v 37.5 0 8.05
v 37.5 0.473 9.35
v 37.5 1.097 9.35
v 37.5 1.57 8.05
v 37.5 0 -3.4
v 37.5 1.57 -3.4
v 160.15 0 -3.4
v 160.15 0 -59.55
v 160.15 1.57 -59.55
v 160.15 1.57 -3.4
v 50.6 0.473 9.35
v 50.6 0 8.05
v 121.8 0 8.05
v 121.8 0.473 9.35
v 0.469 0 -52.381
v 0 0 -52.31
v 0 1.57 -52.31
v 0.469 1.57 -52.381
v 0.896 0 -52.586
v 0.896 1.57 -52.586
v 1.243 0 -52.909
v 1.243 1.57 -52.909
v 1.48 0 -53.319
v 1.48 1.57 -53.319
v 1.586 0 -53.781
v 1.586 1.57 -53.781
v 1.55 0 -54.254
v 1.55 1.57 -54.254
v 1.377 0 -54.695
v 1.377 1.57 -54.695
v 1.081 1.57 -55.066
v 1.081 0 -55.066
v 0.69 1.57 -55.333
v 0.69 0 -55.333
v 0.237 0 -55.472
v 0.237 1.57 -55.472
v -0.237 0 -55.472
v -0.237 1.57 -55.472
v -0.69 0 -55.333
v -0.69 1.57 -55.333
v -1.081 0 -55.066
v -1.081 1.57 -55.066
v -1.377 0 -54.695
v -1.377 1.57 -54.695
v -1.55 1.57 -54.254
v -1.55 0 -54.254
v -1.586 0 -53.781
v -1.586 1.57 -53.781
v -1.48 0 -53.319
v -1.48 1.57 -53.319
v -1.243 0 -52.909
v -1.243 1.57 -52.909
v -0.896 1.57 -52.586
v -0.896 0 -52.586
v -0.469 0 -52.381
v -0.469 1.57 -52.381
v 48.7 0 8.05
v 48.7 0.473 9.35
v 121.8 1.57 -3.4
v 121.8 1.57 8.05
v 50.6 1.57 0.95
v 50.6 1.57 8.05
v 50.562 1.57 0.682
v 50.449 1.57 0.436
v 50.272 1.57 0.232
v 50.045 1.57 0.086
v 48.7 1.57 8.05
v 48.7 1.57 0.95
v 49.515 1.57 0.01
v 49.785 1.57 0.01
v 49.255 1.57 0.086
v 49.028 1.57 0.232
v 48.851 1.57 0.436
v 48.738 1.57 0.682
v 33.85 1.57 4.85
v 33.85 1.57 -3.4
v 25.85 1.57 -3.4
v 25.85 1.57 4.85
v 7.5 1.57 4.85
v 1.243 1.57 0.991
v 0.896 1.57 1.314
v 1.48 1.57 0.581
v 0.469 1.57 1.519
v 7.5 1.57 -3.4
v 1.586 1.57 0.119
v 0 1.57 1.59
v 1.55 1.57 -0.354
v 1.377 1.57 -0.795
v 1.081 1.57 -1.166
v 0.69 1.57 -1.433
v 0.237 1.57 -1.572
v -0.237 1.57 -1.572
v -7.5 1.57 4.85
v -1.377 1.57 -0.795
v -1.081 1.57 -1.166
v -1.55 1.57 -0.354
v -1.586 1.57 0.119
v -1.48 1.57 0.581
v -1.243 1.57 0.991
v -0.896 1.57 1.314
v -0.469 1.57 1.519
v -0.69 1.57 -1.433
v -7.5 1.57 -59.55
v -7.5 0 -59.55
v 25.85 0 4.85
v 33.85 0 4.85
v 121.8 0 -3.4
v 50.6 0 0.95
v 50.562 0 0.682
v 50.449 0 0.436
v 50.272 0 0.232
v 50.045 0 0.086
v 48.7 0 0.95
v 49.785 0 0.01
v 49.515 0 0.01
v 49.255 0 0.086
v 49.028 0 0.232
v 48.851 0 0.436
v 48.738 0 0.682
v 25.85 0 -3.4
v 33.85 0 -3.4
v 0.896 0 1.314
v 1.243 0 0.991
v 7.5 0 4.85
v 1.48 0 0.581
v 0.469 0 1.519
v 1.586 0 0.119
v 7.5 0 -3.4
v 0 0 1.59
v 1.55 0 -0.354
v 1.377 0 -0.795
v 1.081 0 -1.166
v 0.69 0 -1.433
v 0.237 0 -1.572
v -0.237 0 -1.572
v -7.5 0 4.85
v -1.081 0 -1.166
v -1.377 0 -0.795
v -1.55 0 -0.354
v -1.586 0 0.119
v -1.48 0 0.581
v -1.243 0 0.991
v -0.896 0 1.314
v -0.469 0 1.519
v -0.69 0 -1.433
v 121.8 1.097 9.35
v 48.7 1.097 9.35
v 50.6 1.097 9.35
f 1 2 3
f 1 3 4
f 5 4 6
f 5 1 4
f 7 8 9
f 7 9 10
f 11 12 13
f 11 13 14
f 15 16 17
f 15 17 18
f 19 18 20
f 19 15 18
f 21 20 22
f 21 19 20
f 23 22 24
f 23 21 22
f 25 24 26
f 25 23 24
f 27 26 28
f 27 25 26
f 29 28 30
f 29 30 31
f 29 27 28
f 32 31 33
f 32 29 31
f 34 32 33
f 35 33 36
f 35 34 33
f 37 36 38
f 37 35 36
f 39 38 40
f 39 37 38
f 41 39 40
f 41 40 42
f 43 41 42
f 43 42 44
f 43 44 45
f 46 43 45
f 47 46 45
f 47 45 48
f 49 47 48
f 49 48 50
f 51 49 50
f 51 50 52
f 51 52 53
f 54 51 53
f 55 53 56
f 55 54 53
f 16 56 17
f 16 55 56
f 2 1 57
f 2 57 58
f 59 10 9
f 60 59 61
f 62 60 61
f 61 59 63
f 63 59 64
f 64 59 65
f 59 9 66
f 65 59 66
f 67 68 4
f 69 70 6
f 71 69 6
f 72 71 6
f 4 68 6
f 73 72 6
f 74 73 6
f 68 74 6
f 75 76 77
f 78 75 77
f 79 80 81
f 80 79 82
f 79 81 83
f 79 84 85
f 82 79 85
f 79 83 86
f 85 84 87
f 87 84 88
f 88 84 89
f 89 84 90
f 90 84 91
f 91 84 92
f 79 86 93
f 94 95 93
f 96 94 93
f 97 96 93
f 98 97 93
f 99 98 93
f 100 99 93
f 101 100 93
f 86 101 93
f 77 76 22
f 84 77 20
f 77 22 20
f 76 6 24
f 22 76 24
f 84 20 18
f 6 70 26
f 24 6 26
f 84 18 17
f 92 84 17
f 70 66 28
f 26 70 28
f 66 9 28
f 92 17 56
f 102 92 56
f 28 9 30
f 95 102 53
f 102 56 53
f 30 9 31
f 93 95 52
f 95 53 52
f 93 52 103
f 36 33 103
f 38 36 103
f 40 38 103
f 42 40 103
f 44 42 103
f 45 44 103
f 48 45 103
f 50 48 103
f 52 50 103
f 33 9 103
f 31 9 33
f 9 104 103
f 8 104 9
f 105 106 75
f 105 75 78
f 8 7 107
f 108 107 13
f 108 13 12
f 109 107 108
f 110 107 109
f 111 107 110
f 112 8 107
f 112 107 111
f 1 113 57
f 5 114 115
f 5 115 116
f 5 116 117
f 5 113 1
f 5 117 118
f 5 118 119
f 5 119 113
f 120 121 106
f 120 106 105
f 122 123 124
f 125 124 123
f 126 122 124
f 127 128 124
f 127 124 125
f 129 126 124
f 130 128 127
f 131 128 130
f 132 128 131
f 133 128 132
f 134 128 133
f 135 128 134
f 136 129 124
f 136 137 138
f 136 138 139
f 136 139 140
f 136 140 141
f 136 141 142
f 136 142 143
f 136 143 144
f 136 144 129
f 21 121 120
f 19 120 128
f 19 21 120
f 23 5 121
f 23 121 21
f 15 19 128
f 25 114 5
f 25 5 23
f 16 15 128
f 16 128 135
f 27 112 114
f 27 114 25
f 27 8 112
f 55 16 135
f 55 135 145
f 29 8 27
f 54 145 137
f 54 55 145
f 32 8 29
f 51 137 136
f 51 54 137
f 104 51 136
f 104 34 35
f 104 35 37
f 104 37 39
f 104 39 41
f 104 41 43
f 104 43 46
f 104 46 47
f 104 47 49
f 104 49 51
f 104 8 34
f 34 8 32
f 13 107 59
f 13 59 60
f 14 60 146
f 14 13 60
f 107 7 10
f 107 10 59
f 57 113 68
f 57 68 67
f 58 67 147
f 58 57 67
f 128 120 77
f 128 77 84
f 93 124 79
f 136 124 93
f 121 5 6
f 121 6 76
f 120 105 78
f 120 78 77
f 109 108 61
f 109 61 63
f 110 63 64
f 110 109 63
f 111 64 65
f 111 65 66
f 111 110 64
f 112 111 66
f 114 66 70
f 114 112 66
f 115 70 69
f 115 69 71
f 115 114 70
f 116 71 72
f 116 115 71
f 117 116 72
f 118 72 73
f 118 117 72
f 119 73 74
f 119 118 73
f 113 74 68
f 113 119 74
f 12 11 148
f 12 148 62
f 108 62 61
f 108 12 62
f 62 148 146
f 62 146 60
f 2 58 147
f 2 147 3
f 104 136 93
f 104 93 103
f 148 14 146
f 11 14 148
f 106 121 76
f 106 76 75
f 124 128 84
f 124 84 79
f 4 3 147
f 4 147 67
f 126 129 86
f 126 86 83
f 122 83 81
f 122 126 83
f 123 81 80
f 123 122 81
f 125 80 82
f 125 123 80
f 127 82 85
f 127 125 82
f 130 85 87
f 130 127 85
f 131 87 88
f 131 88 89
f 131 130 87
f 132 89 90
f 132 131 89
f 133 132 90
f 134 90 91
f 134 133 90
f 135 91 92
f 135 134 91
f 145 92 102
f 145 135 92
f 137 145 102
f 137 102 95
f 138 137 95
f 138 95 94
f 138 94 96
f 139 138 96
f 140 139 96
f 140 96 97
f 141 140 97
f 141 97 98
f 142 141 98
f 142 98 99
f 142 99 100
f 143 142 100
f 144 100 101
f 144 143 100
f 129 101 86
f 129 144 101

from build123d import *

# Parameters (mm, degrees)
SKETCH_1_R          = 1.59
EXTRUDE_1_DEPTH     = 1.57
CUT_EXTRUDE_1_DEPTH = 84.57


with BuildPart() as part:
    # 草图1 → 凸台-拉伸1 (new body)
    with BuildSketch(Plane(origin=(0, 0, 0), x_dir=(1, 0, 0), z_dir=(0, 1, 0))):
        with BuildLine():
            ThreePointArc((50.6, -0.95), (49.65, 0), (48.7, -0.95))
            Line((48.7, -0.95), (48.7, -9.35))
            Line((48.7, -9.35), (37.5, -9.35))
            Line((37.5, -9.35), (37.5, 3.4))
            Line((37.5, 3.4), (33.85, 3.4))
            Line((33.85, 3.4), (33.85, -4.85))
            Line((33.85, -4.85), (25.85, -4.85))
            Line((25.85, -4.85), (25.85, 3.4))
            Line((25.85, 3.4), (7.5, 3.4))
            Line((7.5, 3.4), (7.5, -4.85))
            Line((7.5, -4.85), (-7.5, -4.85))
            Line((-7.5, -4.85), (-7.5, 4.85))
            Line((-7.5, 4.85), (-7.5, 48.85))
            Line((-7.5, 48.85), (-7.5, 59.55))
            Line((-7.5, 59.55), (160.15, 59.55))
            Line((160.15, 59.55), (160.15, 3.4))
            Line((160.15, 3.4), (121.8, 3.4))
            Line((121.8, 3.4), (121.8, -9.35))
            Line((121.8, -9.35), (50.6, -9.35))
            Line((50.6, -9.35), (50.6, -0.95))
        make_face()
        with Locations(Location((0, 53.9, 0), (0, 0, 270))):
            Circle(SKETCH_1_R, mode=Mode.SUBTRACT)
        with Locations(Location((0, 0, 0), (0, 0, 270))):
            Circle(SKETCH_1_R, mode=Mode.SUBTRACT)
    extrude(amount=EXTRUDE_1_DEPTH)

    # 草图2 → 切除-拉伸1 (cut)
    with BuildSketch(Plane(origin=(121.8, 0, 0), x_dir=(0, 0, -1), z_dir=(1, 0, 0))):
        Polygon((-9.35, 1.096838695), (-8.05, 1.57), (-9.35, 1.57), align=None)
        Polygon((-8.05, 0), (-9.35, 0.473161305), (-9.35, 0), align=None)
    extrude(amount=-CUT_EXTRUDE_1_DEPTH, mode=Mode.SUBTRACT)


solid = part.part
